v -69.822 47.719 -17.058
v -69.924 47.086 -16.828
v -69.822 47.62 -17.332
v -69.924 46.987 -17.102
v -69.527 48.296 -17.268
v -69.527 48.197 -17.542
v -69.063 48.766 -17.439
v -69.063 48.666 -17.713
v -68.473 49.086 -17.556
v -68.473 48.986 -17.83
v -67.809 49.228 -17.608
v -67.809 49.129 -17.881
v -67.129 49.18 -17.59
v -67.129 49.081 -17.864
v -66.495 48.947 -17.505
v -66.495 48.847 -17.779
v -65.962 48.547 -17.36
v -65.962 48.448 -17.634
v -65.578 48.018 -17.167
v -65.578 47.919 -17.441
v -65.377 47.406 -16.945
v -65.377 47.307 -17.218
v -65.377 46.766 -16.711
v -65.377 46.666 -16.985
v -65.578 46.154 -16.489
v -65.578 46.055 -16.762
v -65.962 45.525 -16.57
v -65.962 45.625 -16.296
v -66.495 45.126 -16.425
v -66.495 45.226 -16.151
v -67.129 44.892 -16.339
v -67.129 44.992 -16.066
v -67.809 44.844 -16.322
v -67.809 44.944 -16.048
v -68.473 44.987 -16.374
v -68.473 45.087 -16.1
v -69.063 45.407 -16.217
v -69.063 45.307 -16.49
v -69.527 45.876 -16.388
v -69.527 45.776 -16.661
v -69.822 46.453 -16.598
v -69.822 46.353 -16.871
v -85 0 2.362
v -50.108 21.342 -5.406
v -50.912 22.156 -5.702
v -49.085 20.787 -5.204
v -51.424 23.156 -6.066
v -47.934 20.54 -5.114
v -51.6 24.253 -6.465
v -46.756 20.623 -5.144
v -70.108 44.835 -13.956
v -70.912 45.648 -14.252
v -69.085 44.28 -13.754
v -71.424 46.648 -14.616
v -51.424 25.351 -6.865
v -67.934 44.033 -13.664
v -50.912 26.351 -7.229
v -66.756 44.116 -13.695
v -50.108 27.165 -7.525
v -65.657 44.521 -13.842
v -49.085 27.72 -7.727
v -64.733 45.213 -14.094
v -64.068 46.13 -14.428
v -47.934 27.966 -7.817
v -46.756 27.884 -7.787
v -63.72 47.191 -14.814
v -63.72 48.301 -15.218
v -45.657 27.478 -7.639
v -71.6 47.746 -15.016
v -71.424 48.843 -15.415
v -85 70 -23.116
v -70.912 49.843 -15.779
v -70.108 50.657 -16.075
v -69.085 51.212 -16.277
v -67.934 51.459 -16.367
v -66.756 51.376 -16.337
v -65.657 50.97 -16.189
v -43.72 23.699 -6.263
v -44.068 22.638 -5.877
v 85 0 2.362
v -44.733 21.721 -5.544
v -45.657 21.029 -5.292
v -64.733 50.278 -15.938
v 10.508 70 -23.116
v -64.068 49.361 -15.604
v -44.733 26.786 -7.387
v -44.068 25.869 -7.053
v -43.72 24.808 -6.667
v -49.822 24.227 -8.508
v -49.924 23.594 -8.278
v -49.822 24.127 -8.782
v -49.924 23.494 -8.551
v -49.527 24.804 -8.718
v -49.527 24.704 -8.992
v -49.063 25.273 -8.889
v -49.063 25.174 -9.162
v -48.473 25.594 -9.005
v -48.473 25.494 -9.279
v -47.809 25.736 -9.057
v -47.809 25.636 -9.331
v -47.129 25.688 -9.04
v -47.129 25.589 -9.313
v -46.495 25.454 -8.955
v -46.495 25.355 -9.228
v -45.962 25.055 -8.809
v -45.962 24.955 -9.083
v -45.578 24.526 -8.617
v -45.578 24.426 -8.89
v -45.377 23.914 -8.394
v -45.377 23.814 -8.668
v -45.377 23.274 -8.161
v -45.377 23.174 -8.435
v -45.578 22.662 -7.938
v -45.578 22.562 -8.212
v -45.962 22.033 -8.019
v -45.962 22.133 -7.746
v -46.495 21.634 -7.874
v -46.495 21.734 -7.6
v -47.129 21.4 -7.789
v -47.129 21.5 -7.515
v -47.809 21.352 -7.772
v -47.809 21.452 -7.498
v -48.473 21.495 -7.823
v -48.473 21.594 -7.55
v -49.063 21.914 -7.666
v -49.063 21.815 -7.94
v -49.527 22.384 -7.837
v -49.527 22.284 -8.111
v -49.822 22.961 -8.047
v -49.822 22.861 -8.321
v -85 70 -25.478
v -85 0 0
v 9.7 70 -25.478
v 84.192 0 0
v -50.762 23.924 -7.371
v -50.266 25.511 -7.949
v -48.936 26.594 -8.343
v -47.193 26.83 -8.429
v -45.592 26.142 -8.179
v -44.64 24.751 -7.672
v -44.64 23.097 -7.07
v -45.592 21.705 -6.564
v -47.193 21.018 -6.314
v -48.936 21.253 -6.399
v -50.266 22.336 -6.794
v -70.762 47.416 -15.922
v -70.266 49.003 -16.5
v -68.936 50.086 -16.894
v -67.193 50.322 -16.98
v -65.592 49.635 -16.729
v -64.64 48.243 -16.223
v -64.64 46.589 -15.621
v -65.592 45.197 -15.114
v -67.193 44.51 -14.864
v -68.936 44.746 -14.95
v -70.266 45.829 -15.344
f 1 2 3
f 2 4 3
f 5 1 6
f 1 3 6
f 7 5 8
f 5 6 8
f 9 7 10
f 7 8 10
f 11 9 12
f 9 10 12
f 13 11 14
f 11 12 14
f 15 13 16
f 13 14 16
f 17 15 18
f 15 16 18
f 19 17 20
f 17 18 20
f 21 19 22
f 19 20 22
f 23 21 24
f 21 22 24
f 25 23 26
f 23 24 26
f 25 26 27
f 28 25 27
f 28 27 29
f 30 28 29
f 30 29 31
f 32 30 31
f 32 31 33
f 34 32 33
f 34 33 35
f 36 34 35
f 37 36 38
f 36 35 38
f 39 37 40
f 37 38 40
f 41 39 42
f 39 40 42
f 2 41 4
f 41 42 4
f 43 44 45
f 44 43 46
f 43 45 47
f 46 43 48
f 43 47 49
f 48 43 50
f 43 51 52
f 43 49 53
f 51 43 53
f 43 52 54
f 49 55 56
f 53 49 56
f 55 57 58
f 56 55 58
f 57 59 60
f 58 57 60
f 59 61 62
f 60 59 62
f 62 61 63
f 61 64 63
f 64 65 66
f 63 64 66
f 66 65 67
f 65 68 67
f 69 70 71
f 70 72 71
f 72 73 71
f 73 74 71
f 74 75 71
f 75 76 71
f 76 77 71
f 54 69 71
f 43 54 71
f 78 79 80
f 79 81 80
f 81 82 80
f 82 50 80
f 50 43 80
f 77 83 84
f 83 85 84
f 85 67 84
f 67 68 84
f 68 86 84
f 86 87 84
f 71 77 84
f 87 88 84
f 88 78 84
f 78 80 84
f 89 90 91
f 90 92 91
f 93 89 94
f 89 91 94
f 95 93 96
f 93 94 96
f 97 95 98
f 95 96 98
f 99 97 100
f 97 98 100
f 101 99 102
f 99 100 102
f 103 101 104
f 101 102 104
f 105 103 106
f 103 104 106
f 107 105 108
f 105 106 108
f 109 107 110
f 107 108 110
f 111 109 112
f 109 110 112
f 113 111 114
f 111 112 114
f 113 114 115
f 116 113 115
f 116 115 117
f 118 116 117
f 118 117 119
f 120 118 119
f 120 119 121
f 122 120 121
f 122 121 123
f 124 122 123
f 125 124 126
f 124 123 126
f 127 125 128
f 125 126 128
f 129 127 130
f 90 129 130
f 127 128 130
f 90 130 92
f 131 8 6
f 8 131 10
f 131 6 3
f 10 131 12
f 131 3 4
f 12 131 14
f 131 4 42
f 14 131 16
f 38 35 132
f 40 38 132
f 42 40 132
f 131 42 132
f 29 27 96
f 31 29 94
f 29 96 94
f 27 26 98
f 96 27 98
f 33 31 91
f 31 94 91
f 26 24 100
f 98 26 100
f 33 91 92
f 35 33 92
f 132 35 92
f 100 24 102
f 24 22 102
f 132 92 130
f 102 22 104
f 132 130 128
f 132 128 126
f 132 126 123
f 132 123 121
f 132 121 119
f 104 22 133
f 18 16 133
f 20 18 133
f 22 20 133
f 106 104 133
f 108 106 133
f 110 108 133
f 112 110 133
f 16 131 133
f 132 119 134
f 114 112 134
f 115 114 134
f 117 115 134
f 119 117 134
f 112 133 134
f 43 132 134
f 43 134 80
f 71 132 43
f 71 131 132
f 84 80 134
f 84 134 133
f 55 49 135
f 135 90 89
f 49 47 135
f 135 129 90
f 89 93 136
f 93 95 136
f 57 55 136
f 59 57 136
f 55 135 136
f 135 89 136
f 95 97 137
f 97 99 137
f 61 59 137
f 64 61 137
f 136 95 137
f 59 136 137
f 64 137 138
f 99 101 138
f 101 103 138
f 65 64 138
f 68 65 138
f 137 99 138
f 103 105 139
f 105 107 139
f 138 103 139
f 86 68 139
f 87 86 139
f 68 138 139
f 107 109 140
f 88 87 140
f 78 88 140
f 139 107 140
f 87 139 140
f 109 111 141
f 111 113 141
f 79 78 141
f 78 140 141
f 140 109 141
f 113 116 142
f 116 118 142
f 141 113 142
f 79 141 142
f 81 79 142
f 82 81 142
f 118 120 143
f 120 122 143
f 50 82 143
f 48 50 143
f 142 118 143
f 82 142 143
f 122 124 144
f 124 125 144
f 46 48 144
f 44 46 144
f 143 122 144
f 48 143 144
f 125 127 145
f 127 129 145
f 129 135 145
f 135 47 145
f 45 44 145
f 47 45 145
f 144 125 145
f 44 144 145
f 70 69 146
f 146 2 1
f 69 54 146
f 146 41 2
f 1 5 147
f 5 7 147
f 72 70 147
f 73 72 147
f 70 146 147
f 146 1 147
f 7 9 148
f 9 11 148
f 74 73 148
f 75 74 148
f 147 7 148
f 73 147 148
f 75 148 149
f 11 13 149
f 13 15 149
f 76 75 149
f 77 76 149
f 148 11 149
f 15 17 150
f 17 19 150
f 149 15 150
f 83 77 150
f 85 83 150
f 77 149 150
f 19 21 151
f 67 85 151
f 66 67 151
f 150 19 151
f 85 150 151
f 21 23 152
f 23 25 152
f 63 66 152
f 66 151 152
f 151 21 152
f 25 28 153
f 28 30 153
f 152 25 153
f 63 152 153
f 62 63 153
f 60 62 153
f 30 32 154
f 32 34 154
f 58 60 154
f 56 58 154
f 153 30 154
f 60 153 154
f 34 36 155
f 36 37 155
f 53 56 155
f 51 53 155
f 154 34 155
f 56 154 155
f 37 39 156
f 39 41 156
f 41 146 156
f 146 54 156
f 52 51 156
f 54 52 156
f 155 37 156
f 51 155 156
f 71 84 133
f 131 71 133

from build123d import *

# Parameters (mm, degrees)
MAIN_DEPTH                   = 85
BACKBRACKETHOLES_D           = 4.572
BACKBRACKETHOLES_DEPTH       = 5
BACKBRACKETHOLES_CSINK_D     = 7.9248
BACKBRACKETHOLES_CSINK_ANGLE = 82
FRONT_CUT_REACH              = 115.044


with BuildPart() as part:
    # Sketch1 → Main (new, symmetric)
    with BuildSketch(Plane(origin=(0, 0, 0), x_dir=(0, 0, -1), z_dir=(1, 0, 0))):
        Polygon((0, 0), (-2.3622, 0), (23.115716399, 70), (25.477916399, 70), align=None)
    extrude(amount=MAIN_DEPTH, both=True)

    # BackBracketHoles
    with Locations(Plane(origin=(0, 0.759196446, 2.085875092), x_dir=(1, 0, 0), z_dir=(0, 0.3420201433256726, 0.9396926207859071))):
        with Locations((-67.6378, 50.002080017), (-47.6378, 25.002080017)):
            CounterSinkHole(BACKBRACKETHOLES_D / 2, BACKBRACKETHOLES_CSINK_D / 2, depth=BACKBRACKETHOLES_DEPTH, counter_sink_angle=BACKBRACKETHOLES_CSINK_ANGLE)

    # Sketch4 → Front Cut (cut, up to next)
    with BuildSketch(Plane(origin=(0, 0.759196446, 2.085875092), x_dir=(1, 0, 0), z_dir=(0, 0.3420201433256726, 0.9396926207859071)), mode=Mode.PRIVATE) as front_cut_sk1:
        Polygon((85, -0.807919983), (9.699635944, 74.492444073), (85, 74.492444073), align=None)
    front_cut_tool1 = extrude(front_cut_sk1.sketch, amount=-FRONT_CUT_REACH, mode=Mode.PRIVATE) & part.part
    add(front_cut_tool1.solids().sort_by_distance((59.899879, 47.172798, -14.807294))[0], mode=Mode.SUBTRACT)


solid = part.part
